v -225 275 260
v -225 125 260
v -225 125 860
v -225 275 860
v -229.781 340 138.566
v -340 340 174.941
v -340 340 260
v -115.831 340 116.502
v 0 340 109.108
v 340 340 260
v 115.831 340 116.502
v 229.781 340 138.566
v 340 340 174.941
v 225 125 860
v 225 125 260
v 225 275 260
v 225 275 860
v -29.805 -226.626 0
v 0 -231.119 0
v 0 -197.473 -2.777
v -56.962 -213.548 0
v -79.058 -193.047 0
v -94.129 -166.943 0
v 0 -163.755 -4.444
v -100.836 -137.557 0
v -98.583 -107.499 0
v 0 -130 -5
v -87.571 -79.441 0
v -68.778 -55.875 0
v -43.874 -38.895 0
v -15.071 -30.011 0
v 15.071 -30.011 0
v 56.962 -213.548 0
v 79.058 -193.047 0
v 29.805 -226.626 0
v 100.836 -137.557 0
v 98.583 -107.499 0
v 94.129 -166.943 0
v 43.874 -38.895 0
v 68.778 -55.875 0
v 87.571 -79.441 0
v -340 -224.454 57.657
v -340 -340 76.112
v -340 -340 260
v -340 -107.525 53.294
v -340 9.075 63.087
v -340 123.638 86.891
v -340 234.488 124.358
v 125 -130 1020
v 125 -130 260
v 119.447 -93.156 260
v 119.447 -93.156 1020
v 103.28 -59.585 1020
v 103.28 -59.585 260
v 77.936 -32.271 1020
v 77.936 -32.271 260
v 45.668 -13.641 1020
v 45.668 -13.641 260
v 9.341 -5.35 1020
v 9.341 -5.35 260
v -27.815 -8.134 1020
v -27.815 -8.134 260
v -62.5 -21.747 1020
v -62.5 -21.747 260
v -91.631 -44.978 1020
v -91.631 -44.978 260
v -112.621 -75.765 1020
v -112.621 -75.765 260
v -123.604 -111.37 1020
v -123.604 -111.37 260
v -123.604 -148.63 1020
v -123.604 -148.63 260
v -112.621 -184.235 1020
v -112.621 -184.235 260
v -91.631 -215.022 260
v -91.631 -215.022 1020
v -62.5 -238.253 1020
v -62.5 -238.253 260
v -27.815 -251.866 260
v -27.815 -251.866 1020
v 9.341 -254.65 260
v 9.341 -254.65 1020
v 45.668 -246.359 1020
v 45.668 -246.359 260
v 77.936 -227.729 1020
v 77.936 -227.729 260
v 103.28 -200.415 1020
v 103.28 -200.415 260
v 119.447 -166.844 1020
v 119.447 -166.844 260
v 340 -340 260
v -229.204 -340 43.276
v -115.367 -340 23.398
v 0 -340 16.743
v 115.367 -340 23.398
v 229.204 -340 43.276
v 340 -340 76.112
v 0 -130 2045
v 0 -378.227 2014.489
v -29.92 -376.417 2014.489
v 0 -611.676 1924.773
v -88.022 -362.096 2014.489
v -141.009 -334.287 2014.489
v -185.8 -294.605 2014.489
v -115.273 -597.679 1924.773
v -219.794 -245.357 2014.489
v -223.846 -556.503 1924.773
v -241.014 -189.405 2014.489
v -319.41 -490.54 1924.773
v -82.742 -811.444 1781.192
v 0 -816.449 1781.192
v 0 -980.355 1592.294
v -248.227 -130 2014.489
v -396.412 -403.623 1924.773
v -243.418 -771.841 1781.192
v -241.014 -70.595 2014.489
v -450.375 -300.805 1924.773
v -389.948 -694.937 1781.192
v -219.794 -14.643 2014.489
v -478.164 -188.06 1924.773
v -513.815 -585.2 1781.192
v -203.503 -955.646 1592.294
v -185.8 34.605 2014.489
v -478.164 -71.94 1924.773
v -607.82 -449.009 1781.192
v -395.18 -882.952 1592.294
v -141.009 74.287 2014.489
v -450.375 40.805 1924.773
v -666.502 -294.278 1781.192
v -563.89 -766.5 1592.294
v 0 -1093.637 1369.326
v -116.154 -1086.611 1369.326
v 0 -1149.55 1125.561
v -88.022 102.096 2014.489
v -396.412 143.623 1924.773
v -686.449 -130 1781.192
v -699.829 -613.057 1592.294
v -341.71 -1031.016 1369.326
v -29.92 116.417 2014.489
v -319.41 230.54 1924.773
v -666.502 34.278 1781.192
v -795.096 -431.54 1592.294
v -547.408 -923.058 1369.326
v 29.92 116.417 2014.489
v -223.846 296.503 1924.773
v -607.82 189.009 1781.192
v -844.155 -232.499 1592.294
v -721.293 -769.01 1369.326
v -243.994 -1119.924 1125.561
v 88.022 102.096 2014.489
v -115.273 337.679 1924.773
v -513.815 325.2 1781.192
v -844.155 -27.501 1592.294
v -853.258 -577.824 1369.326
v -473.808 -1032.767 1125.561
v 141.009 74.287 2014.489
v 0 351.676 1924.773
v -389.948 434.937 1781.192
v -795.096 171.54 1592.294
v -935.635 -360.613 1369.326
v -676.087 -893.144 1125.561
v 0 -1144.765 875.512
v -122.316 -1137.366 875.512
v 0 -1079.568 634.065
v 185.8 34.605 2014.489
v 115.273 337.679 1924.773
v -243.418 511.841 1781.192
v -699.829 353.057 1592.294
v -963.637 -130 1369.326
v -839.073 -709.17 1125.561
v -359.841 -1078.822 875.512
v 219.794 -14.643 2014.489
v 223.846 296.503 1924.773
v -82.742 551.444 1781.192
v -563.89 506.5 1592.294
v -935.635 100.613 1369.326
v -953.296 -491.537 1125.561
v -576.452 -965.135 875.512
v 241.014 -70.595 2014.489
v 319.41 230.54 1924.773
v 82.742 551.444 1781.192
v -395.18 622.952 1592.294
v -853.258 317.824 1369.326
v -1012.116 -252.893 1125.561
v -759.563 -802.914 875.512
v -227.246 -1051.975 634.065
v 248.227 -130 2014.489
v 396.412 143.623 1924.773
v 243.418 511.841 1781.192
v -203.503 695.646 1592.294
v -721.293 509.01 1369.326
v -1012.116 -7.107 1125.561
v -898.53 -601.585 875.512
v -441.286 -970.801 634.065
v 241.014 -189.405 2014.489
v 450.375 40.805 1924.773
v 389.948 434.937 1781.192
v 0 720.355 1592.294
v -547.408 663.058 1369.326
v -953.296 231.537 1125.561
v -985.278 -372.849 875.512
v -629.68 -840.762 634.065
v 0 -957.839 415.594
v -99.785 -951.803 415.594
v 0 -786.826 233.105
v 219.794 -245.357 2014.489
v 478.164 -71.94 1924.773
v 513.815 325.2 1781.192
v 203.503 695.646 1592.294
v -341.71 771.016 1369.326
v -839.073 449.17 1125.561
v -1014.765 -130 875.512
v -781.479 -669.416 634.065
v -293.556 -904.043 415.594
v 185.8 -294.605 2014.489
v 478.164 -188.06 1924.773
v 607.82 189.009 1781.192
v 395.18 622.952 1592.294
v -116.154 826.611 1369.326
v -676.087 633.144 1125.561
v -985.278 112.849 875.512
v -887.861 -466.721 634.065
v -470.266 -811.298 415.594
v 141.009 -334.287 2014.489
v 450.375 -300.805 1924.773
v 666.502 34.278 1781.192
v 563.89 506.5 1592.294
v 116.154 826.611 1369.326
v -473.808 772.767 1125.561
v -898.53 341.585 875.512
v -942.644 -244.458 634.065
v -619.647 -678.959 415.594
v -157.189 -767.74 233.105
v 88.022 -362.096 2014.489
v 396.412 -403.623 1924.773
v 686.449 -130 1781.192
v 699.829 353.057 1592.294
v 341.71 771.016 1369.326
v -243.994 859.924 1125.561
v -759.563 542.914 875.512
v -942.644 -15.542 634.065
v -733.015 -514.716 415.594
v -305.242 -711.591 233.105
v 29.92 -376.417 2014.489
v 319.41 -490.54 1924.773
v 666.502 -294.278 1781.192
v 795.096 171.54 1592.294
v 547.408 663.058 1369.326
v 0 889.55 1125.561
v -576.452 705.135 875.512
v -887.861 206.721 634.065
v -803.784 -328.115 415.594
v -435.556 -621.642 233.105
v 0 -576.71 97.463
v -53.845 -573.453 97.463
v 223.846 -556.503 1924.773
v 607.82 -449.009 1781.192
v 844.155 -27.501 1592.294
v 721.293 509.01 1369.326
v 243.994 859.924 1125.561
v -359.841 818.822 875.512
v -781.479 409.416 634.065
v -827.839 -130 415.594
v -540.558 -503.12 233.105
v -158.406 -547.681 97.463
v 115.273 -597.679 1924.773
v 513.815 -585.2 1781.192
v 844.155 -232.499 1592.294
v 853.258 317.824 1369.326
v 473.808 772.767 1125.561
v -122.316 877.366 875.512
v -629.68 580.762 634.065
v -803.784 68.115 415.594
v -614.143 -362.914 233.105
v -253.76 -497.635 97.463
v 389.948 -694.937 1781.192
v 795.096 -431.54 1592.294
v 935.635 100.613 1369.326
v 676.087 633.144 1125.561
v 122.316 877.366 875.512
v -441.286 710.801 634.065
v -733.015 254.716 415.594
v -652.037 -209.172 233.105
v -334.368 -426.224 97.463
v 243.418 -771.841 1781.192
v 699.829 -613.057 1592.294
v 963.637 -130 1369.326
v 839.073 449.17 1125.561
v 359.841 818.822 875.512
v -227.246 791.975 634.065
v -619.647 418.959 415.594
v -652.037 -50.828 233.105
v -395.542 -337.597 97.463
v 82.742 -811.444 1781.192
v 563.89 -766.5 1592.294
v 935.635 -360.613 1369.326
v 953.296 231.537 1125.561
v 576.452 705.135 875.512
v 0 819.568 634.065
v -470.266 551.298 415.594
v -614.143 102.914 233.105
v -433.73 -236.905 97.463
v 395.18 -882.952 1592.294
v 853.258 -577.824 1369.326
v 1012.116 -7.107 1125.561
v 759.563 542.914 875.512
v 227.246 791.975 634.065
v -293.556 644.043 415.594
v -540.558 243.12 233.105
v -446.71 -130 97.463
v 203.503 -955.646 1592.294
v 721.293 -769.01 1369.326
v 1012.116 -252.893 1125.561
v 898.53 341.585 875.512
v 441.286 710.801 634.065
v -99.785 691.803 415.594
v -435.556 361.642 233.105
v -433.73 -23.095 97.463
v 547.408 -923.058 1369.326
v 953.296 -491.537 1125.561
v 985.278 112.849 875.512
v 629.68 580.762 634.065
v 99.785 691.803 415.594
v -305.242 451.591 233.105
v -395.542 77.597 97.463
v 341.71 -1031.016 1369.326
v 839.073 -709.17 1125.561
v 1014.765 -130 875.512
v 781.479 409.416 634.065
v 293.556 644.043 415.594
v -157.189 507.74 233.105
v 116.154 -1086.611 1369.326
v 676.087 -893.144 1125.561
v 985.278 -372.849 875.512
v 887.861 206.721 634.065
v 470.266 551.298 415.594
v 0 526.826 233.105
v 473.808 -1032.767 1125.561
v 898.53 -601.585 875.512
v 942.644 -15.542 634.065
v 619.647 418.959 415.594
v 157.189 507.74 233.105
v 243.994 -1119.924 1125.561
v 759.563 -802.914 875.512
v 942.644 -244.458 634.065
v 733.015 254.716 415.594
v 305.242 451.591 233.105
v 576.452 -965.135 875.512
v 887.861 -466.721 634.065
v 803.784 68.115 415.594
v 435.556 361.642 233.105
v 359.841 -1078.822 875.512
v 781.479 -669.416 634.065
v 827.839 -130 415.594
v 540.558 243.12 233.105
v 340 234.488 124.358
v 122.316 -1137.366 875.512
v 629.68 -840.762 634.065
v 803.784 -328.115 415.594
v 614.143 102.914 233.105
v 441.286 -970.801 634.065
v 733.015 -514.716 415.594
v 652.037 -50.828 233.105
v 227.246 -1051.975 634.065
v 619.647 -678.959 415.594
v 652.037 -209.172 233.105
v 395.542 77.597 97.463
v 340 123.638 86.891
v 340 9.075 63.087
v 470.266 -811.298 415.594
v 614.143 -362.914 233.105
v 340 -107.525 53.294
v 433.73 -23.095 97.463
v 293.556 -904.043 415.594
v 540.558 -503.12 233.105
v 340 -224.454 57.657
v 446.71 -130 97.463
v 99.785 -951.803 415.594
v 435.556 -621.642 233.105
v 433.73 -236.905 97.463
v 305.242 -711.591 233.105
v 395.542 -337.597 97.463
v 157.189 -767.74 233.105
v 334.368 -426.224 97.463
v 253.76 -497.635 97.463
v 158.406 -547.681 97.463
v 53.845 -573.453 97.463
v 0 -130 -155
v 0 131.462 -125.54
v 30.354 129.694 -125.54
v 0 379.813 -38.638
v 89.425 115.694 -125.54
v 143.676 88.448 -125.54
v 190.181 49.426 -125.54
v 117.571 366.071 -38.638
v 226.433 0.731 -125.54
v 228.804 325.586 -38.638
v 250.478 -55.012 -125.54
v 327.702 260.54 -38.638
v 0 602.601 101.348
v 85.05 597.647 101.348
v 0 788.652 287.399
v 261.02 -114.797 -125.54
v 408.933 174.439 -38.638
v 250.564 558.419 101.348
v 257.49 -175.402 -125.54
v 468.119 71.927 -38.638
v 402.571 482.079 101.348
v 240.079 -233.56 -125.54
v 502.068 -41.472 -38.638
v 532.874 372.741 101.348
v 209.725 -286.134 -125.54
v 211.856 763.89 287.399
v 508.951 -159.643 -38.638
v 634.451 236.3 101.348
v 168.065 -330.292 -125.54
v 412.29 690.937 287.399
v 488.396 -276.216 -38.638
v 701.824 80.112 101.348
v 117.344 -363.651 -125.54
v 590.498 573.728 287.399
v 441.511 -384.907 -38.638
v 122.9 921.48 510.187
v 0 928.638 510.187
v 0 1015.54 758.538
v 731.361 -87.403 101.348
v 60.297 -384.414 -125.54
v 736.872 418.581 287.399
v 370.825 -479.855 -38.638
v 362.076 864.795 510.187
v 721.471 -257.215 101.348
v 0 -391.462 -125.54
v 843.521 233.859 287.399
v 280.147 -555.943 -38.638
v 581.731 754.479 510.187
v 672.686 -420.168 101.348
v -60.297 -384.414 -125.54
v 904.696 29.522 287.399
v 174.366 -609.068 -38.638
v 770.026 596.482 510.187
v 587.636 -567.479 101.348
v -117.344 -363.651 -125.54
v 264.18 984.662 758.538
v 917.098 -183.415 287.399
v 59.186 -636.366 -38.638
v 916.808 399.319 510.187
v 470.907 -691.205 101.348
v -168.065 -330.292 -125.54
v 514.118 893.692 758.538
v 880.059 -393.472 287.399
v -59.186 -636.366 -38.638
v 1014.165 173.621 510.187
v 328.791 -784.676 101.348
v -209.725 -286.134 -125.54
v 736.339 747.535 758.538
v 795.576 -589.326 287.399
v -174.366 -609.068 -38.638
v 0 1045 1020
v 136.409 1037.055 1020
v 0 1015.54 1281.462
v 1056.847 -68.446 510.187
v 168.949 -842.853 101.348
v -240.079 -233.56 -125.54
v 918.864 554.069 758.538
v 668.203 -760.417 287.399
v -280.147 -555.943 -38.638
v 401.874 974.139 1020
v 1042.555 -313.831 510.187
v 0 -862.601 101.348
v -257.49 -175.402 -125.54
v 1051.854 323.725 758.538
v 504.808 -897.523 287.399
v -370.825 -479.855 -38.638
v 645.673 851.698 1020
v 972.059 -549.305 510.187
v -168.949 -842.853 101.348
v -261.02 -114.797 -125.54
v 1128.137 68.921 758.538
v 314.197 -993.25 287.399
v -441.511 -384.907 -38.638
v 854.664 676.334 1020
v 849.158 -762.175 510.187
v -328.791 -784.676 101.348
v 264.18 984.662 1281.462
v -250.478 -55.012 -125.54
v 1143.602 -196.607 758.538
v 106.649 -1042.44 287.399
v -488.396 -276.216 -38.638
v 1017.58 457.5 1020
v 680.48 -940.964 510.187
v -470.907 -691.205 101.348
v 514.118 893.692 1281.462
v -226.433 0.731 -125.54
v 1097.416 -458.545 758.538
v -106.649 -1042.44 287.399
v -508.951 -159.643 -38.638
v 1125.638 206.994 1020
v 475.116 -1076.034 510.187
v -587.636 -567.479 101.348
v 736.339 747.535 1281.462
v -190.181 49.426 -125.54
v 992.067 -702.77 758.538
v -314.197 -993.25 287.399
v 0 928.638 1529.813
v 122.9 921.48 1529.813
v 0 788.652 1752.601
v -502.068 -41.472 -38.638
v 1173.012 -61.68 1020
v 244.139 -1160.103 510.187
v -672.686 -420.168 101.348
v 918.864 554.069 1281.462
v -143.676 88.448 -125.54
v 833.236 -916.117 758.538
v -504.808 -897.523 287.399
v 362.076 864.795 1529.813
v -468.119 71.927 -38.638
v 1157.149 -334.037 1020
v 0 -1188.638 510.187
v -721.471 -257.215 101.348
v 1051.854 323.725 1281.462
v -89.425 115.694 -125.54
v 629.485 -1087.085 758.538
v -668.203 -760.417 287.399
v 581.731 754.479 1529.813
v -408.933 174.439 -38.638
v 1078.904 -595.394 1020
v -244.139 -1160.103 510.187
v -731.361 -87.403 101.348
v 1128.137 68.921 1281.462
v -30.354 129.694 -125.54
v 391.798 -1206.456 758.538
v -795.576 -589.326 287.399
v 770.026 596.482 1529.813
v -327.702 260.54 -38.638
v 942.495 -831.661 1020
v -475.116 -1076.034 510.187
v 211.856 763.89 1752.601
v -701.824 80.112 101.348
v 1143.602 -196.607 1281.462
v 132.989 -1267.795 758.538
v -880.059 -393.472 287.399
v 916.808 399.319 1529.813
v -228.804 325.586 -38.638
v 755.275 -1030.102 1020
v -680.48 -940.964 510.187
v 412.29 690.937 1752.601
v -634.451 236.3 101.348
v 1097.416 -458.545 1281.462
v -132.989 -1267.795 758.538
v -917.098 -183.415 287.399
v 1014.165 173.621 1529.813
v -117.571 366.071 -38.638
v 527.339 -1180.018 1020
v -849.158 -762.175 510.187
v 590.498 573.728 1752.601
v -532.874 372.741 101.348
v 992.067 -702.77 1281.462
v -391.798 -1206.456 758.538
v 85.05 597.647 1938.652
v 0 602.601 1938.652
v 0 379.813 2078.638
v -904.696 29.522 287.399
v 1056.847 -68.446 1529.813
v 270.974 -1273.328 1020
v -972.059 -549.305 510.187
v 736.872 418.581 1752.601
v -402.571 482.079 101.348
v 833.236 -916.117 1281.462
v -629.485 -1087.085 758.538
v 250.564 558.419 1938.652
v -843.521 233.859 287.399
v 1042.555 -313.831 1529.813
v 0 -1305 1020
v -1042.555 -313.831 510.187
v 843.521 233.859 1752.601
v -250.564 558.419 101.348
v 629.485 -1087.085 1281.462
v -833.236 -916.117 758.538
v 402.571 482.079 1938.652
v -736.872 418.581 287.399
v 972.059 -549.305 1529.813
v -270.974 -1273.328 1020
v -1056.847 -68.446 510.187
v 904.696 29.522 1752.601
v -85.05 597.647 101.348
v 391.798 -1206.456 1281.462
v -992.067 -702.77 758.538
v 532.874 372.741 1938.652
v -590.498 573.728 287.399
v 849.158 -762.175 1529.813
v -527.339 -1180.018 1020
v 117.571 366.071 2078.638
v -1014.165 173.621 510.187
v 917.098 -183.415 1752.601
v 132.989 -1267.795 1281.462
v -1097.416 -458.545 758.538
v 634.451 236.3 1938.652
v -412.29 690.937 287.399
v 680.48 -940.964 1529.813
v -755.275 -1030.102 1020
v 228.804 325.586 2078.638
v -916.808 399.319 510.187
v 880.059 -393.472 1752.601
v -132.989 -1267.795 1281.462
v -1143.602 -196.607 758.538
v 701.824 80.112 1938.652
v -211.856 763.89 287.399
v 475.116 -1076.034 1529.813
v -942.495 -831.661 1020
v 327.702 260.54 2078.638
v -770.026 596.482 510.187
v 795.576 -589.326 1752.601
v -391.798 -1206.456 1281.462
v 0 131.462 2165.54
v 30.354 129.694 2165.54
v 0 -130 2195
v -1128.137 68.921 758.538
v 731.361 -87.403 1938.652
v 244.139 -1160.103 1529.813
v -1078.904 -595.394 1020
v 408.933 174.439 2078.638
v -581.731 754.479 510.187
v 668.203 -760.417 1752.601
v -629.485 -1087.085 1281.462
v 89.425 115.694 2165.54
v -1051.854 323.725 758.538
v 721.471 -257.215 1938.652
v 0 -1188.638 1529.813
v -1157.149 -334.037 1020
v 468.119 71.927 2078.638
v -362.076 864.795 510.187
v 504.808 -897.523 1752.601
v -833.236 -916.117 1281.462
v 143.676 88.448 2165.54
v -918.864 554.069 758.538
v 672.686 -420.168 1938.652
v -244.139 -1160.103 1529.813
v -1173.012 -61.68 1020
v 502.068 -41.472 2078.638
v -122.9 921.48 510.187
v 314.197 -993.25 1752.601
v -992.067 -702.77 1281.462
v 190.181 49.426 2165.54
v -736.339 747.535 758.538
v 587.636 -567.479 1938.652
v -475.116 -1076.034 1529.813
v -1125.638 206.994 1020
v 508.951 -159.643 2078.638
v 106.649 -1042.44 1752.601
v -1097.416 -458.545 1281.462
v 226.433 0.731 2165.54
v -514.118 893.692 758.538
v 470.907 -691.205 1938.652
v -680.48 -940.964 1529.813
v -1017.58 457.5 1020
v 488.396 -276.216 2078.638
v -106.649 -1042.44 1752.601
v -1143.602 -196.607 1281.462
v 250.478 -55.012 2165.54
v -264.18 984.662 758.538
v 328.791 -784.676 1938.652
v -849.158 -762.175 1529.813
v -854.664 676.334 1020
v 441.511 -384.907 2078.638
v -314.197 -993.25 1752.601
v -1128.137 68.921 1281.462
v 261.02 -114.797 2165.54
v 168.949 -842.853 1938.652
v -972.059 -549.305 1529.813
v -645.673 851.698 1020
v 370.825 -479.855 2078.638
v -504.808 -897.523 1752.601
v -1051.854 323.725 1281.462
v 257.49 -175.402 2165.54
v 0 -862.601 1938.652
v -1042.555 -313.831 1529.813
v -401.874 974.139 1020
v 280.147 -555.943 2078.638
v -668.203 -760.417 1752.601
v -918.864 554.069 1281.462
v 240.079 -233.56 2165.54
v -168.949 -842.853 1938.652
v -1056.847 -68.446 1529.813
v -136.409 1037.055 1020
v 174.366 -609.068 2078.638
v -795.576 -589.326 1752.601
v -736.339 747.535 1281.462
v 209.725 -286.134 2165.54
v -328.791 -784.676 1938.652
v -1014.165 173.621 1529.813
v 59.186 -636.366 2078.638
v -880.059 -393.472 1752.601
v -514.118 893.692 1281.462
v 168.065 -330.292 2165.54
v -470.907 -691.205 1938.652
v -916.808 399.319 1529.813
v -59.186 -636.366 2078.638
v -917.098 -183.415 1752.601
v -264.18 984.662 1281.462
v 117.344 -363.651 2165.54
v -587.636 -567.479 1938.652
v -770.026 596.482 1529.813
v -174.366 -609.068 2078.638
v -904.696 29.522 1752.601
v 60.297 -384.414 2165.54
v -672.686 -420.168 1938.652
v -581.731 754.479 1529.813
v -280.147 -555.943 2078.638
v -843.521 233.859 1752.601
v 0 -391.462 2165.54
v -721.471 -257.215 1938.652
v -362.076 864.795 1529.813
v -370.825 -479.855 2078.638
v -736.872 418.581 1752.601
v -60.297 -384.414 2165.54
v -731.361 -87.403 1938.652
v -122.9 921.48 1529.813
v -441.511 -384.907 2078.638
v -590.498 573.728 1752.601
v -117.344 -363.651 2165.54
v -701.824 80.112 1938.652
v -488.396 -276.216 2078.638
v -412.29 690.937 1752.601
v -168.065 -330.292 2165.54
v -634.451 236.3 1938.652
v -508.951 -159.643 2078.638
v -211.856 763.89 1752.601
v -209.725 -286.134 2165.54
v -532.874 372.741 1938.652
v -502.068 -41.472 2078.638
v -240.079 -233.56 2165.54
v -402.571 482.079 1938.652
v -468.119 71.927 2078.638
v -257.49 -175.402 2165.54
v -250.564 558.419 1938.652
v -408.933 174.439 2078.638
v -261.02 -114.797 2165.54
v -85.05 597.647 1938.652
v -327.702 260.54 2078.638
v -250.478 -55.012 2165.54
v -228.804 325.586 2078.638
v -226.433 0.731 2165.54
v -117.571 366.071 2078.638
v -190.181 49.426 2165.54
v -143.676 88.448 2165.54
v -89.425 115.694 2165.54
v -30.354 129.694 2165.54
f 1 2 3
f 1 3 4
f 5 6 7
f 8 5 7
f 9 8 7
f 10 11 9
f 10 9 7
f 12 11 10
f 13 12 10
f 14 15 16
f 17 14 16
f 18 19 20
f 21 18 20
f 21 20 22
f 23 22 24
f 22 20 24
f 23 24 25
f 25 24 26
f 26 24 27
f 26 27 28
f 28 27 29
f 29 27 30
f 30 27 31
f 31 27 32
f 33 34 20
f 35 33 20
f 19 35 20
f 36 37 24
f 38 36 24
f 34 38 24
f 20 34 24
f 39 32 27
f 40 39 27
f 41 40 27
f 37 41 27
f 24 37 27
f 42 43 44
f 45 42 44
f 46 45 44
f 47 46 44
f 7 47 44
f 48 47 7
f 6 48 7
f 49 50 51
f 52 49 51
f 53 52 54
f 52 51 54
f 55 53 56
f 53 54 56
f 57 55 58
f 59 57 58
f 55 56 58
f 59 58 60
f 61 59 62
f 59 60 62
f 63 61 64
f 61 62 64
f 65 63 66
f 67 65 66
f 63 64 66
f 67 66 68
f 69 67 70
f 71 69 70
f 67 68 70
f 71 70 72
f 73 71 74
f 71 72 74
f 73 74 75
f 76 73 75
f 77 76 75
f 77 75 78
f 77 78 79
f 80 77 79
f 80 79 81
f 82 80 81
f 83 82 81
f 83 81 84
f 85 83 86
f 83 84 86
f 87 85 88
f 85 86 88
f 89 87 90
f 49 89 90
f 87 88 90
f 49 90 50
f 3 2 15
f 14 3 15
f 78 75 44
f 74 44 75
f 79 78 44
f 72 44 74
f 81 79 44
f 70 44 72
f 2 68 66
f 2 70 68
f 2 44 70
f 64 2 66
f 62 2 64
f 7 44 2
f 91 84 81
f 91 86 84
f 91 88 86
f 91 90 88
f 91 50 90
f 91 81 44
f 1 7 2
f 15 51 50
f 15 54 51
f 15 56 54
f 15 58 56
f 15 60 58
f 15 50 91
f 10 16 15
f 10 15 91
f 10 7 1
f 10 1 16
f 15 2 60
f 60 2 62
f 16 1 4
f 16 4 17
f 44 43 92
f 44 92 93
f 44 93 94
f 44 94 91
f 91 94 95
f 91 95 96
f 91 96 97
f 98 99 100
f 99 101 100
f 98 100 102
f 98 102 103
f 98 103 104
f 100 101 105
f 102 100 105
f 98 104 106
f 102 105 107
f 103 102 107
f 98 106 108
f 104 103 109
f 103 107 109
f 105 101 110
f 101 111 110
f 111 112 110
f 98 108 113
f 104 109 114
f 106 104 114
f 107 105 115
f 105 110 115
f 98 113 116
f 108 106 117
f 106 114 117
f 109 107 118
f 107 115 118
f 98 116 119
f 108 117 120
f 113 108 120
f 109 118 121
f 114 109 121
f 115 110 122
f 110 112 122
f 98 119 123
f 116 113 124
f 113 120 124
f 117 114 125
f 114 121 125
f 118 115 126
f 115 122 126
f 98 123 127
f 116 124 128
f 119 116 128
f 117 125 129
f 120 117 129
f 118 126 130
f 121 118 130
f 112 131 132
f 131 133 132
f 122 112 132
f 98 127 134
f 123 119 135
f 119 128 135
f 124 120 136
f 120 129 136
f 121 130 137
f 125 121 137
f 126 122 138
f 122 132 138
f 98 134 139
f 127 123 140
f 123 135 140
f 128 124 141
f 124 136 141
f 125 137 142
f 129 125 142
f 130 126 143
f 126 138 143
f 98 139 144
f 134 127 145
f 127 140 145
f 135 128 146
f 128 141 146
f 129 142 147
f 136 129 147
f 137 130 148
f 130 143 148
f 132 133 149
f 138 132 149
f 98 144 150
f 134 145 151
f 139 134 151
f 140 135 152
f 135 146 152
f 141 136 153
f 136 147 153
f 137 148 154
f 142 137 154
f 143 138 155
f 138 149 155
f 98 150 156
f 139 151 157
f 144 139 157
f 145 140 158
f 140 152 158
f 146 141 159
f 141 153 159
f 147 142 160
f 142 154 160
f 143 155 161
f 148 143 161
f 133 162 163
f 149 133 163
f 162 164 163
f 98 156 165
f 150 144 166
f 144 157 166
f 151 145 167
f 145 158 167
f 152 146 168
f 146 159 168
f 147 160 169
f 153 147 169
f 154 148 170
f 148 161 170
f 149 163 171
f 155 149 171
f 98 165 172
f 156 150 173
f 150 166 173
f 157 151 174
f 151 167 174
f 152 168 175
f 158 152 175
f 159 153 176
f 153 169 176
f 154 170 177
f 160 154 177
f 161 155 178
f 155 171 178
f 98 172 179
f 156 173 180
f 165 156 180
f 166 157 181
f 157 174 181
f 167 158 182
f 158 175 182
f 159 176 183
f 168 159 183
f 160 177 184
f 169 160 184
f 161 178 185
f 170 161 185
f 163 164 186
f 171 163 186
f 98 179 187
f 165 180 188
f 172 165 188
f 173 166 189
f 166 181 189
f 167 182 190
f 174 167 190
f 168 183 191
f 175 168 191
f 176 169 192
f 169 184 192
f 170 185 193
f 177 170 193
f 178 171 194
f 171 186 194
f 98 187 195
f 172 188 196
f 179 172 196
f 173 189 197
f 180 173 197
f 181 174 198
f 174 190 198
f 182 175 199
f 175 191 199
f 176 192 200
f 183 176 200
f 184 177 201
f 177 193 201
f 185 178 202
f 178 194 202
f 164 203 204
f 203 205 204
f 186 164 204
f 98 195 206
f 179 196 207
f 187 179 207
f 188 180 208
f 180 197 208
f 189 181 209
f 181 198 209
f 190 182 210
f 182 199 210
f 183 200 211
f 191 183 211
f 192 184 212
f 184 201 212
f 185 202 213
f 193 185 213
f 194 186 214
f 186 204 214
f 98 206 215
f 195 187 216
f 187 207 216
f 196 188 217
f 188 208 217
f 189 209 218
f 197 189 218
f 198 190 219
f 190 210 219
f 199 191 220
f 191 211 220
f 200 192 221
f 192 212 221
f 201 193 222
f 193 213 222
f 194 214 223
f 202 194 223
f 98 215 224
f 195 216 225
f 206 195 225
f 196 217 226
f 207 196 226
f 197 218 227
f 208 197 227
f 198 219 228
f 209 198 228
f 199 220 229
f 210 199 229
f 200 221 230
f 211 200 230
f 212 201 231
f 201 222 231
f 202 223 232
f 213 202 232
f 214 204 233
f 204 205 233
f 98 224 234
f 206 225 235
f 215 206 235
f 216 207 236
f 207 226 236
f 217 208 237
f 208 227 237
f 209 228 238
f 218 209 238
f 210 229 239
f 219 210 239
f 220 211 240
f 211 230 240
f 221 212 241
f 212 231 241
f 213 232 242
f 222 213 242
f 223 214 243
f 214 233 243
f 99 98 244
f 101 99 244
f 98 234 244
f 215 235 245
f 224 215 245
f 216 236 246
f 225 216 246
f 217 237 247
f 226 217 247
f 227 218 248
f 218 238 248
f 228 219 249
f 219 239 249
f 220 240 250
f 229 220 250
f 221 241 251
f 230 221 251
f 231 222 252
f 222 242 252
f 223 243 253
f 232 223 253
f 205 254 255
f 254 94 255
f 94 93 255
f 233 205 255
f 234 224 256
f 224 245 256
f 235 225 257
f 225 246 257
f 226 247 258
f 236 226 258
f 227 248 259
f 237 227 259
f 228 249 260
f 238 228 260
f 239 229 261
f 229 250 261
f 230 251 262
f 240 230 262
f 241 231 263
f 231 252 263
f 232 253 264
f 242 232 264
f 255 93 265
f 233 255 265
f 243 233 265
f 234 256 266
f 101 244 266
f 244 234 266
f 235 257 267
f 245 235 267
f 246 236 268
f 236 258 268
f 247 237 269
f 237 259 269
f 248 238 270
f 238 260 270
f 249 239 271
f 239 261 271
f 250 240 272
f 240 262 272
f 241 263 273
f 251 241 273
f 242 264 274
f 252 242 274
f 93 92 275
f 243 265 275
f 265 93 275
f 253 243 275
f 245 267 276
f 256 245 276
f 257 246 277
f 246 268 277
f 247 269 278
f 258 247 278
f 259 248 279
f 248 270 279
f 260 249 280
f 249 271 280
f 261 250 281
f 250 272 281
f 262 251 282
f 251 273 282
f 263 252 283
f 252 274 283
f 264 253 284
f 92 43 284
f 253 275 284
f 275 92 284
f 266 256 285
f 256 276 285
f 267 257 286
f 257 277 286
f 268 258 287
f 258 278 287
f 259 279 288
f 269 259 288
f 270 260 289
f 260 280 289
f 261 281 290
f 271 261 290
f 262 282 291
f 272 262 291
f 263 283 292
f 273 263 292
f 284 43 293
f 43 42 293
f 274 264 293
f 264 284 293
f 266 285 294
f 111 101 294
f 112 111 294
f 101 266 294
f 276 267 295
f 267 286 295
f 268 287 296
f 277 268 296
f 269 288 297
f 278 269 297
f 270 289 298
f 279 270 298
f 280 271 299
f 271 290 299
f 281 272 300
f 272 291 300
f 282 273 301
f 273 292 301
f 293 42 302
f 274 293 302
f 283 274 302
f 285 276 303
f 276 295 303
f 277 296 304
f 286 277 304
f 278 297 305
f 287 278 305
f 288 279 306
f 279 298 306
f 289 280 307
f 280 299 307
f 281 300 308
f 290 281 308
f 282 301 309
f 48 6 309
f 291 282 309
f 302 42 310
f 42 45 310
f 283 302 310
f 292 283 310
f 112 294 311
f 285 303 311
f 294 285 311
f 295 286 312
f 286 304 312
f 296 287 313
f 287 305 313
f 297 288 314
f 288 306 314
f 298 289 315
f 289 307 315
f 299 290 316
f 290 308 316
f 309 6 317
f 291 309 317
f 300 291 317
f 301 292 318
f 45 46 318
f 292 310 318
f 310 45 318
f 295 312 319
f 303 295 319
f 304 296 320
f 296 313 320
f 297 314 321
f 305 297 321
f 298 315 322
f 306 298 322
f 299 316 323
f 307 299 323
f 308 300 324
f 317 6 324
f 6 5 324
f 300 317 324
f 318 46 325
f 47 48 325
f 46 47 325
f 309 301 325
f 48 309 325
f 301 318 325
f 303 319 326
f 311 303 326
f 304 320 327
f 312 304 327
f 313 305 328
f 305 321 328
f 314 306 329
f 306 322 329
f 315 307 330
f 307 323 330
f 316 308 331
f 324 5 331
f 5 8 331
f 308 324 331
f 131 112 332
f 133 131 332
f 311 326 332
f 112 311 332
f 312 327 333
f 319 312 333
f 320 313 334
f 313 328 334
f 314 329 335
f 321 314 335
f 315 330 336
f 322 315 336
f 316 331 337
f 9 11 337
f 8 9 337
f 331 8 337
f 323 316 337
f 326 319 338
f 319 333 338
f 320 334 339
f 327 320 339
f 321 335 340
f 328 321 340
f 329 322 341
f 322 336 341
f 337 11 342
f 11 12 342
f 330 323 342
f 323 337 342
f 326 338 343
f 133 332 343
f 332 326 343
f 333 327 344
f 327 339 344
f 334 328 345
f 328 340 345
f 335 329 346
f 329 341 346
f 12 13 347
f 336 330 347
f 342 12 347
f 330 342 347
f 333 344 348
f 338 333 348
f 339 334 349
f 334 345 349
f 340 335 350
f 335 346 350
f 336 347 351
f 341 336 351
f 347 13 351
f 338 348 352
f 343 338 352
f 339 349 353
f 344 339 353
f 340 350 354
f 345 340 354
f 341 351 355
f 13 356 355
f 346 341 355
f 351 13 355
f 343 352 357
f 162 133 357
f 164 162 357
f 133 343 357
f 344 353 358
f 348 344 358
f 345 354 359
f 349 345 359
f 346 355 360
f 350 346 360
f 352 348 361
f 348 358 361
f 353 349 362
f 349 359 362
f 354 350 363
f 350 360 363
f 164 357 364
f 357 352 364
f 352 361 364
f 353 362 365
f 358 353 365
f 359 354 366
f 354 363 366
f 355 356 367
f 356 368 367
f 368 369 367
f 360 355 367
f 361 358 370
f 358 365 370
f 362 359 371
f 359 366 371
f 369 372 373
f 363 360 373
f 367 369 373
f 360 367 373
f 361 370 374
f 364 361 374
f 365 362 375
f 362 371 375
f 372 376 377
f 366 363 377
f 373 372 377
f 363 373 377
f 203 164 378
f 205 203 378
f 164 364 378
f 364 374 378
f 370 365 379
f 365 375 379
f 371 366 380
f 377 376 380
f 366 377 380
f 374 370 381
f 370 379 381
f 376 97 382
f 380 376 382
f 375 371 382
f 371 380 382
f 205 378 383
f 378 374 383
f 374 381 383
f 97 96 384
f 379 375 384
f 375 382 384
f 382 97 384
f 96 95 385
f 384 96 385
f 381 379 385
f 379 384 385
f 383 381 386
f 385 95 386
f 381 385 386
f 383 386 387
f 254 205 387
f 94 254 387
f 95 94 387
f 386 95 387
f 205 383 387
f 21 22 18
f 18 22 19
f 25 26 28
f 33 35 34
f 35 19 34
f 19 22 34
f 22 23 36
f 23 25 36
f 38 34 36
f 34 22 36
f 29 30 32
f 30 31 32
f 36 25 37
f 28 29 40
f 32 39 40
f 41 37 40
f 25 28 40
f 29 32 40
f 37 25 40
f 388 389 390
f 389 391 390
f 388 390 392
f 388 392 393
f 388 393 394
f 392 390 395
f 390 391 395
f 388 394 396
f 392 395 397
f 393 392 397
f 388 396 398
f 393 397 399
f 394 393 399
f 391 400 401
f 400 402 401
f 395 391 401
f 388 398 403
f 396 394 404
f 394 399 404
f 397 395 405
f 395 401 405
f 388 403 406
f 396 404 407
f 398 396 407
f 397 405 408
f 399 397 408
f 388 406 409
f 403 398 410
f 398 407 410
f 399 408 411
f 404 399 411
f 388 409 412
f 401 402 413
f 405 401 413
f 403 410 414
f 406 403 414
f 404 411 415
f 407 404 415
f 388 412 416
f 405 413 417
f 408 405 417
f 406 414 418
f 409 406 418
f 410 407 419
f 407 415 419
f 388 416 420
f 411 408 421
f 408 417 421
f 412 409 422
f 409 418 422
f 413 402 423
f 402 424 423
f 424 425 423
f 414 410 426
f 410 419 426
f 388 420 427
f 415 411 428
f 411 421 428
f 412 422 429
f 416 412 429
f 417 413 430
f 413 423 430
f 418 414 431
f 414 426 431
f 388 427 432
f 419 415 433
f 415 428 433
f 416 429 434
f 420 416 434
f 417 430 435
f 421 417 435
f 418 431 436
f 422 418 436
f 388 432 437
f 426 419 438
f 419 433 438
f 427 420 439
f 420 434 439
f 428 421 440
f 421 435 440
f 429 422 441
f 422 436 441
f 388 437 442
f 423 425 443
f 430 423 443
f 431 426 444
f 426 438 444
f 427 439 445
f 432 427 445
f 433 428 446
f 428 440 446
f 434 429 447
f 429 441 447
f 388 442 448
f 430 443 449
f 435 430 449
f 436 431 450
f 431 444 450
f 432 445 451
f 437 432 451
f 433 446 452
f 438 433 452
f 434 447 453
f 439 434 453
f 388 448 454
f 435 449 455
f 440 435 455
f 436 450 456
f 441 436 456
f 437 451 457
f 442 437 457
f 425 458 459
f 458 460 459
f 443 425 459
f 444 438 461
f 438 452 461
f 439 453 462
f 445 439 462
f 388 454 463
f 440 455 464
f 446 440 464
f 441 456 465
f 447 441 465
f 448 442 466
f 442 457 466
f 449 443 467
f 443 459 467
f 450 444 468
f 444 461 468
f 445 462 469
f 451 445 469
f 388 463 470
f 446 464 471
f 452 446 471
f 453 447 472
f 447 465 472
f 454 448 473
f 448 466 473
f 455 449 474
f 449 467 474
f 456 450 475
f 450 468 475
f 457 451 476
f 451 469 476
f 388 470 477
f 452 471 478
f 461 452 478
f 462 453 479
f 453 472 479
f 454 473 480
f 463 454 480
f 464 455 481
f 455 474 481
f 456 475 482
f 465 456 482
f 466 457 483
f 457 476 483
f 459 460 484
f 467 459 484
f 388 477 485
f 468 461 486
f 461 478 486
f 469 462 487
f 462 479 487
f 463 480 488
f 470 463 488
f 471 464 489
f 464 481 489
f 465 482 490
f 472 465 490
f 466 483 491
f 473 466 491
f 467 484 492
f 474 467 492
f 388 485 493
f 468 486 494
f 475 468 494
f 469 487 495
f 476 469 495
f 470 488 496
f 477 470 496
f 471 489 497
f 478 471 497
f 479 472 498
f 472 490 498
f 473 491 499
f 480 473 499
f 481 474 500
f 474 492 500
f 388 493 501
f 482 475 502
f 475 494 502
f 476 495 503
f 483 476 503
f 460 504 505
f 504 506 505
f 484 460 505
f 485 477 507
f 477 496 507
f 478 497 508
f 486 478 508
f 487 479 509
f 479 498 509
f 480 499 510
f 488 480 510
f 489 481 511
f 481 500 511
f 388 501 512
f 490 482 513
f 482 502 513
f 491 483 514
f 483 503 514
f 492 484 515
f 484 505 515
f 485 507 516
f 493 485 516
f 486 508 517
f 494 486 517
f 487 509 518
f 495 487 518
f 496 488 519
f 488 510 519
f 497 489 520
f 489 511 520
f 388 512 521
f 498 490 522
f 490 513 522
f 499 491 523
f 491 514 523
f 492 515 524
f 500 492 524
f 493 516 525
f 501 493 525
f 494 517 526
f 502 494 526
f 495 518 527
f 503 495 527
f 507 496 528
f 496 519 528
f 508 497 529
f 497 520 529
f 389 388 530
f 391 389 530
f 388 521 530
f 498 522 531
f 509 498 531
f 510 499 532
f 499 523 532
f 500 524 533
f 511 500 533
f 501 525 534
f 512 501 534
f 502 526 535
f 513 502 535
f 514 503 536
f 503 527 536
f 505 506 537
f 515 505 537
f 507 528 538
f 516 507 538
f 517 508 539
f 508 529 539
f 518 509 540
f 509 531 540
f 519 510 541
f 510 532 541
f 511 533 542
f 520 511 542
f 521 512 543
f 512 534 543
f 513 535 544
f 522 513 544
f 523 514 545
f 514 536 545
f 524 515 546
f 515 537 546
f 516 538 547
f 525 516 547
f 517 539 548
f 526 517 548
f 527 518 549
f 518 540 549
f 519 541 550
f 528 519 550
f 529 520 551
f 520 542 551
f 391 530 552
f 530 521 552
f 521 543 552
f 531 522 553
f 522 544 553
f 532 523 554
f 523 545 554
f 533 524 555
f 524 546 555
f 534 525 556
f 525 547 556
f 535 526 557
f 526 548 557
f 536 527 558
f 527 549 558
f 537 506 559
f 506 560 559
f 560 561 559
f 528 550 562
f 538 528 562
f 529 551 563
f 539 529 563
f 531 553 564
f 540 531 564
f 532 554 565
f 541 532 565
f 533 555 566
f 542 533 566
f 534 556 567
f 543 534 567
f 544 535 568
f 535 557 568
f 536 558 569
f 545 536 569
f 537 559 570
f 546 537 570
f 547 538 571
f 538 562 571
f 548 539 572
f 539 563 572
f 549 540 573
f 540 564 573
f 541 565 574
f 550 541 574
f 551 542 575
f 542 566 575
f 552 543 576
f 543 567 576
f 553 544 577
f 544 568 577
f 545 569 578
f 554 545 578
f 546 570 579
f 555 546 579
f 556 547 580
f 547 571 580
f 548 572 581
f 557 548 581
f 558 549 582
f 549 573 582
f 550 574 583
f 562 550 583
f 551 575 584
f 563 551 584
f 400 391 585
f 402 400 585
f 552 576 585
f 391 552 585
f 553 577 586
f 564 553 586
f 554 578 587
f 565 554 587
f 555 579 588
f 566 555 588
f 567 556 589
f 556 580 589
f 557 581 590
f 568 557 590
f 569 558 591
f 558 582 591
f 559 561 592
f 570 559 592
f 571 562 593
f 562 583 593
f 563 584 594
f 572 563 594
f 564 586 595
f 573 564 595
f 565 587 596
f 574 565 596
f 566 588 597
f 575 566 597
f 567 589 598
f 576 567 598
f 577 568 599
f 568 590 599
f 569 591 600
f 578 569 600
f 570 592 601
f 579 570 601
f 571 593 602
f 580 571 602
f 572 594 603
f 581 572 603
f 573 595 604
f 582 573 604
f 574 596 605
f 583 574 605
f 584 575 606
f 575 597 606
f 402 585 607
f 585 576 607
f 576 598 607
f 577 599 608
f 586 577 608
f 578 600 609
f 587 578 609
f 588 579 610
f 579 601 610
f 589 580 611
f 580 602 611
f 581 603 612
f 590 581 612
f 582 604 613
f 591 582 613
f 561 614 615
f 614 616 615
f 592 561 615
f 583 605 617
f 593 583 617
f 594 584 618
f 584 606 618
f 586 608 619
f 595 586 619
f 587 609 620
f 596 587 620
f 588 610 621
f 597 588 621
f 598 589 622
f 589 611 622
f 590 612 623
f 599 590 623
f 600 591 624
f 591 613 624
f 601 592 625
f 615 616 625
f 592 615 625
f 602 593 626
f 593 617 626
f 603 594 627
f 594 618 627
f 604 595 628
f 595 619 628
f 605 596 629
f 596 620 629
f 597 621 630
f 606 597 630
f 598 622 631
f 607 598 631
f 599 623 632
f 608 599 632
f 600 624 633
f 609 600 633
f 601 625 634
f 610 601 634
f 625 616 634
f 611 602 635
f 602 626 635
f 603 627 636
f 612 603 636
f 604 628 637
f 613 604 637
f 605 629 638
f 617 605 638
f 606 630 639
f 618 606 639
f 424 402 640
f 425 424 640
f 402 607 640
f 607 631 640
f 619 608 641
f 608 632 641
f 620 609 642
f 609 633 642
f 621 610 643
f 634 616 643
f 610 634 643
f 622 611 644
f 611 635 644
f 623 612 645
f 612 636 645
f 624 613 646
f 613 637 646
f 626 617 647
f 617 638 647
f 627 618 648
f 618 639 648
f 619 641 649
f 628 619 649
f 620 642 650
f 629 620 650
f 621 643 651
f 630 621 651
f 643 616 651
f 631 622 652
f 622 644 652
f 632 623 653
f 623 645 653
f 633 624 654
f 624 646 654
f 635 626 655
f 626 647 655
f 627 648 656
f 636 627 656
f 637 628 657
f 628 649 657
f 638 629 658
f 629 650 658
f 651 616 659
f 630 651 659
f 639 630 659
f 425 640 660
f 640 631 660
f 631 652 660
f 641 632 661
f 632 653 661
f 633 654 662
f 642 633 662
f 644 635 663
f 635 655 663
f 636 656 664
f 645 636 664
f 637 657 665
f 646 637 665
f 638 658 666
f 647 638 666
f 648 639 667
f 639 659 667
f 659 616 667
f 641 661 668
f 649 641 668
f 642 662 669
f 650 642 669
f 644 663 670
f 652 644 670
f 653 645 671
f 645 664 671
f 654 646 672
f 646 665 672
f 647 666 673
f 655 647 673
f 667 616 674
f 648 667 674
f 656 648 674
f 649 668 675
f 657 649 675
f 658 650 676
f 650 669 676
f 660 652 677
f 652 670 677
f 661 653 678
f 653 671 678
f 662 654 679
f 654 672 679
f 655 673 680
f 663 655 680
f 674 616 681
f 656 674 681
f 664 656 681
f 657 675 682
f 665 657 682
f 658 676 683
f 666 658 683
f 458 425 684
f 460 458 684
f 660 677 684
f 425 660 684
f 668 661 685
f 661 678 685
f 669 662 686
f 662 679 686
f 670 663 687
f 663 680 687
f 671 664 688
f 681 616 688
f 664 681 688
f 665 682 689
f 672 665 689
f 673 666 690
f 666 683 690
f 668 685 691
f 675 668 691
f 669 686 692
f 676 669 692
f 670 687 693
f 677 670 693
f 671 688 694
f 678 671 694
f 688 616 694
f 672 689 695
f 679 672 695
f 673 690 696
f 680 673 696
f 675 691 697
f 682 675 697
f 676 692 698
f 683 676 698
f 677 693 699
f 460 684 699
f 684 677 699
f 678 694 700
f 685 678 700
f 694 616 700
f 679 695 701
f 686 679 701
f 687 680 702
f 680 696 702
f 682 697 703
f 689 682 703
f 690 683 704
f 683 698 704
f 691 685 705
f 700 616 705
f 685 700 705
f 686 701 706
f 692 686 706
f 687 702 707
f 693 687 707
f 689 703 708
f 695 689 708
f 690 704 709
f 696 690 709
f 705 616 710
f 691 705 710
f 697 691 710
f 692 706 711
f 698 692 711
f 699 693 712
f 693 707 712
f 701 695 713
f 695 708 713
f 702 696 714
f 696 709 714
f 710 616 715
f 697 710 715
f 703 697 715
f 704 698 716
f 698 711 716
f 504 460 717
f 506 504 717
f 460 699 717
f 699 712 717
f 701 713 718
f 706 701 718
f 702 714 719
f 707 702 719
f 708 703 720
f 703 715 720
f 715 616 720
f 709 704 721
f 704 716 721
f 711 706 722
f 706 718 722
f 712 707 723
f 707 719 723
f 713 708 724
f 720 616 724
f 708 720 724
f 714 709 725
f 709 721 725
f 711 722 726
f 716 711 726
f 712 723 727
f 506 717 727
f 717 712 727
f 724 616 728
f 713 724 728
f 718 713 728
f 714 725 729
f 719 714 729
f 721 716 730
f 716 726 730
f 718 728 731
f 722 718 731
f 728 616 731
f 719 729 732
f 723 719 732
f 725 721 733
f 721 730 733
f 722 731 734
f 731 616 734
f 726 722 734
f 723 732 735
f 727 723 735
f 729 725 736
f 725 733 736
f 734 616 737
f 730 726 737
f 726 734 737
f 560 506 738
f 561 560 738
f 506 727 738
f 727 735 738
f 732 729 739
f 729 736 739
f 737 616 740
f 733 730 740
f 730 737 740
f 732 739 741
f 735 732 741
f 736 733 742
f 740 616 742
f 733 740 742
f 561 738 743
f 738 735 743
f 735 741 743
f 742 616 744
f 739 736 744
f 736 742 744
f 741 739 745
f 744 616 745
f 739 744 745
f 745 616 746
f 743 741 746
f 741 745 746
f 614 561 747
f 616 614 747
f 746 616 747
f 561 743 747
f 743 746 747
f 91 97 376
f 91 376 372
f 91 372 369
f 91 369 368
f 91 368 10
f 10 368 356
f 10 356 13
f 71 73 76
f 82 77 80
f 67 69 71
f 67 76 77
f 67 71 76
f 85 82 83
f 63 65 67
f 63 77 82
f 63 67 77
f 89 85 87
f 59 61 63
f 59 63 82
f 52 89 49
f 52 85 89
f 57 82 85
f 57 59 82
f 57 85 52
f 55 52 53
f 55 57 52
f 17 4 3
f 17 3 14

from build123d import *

# Parameters (mm, degrees)
F0_W     = 680
F0_H     = 680
F1_DEPTH = 260
F2_R     = 125
F3_DEPTH = 760
F2_W     = 450
F2_H     = 150
F4_DEPTH = 600


with BuildPart() as f1:
    # F0 (on Top) → F1 (new body)
    with BuildSketch(Plane.XY):
        Rectangle(F0_W, F0_H)
    extrude(amount=F1_DEPTH)

    # F2 (on face) → F3 (join)
    with BuildSketch(Plane.XY.offset(260)):
        with Locations((0, -130)):
            Circle(F2_R)
    extrude(amount=F3_DEPTH)

    # F2 (on face) → F4 (join)
    with BuildSketch(Plane.XY.offset(260)):
        with Locations((0, 200)):
            Rectangle(F2_W, F2_H)
    extrude(amount=F4_DEPTH)

    # F5 (on Right) → F6 (revolve)
    with BuildSketch(Plane.YZ):
        with BuildLine():
            ThreePointArc((-130, 125), (765, 1020), (-130, 1915))
            Line((-130, 1915), (-130, 125))
        make_face()
        with BuildLine():
            Line((-130, 2195), (-130, 2045))
            Line((-130, 2045), (-130, 1915))
            ThreePointArc((-130, 1915), (765, 1020), (-130, 125))
            Line((-130, 125), (-130, -5))
            Line((-130, -5), (-130, -155))
            ThreePointArc((-130, -155), (1045, 1020), (-130, 2195))
        make_face()
        with BuildLine():
            Line((-130, 1915), (-130, 2045))
            ThreePointArc((-130, 2045), (-1155, 1020), (-130, -5))
            Line((-130, -5), (-130, 125))
            Line((-130, 125), (-130, 1915))
        make_face()
    revolve(axis=Axis((0, -130, 1020), (0, 0, -1)))


solid = f1.part
